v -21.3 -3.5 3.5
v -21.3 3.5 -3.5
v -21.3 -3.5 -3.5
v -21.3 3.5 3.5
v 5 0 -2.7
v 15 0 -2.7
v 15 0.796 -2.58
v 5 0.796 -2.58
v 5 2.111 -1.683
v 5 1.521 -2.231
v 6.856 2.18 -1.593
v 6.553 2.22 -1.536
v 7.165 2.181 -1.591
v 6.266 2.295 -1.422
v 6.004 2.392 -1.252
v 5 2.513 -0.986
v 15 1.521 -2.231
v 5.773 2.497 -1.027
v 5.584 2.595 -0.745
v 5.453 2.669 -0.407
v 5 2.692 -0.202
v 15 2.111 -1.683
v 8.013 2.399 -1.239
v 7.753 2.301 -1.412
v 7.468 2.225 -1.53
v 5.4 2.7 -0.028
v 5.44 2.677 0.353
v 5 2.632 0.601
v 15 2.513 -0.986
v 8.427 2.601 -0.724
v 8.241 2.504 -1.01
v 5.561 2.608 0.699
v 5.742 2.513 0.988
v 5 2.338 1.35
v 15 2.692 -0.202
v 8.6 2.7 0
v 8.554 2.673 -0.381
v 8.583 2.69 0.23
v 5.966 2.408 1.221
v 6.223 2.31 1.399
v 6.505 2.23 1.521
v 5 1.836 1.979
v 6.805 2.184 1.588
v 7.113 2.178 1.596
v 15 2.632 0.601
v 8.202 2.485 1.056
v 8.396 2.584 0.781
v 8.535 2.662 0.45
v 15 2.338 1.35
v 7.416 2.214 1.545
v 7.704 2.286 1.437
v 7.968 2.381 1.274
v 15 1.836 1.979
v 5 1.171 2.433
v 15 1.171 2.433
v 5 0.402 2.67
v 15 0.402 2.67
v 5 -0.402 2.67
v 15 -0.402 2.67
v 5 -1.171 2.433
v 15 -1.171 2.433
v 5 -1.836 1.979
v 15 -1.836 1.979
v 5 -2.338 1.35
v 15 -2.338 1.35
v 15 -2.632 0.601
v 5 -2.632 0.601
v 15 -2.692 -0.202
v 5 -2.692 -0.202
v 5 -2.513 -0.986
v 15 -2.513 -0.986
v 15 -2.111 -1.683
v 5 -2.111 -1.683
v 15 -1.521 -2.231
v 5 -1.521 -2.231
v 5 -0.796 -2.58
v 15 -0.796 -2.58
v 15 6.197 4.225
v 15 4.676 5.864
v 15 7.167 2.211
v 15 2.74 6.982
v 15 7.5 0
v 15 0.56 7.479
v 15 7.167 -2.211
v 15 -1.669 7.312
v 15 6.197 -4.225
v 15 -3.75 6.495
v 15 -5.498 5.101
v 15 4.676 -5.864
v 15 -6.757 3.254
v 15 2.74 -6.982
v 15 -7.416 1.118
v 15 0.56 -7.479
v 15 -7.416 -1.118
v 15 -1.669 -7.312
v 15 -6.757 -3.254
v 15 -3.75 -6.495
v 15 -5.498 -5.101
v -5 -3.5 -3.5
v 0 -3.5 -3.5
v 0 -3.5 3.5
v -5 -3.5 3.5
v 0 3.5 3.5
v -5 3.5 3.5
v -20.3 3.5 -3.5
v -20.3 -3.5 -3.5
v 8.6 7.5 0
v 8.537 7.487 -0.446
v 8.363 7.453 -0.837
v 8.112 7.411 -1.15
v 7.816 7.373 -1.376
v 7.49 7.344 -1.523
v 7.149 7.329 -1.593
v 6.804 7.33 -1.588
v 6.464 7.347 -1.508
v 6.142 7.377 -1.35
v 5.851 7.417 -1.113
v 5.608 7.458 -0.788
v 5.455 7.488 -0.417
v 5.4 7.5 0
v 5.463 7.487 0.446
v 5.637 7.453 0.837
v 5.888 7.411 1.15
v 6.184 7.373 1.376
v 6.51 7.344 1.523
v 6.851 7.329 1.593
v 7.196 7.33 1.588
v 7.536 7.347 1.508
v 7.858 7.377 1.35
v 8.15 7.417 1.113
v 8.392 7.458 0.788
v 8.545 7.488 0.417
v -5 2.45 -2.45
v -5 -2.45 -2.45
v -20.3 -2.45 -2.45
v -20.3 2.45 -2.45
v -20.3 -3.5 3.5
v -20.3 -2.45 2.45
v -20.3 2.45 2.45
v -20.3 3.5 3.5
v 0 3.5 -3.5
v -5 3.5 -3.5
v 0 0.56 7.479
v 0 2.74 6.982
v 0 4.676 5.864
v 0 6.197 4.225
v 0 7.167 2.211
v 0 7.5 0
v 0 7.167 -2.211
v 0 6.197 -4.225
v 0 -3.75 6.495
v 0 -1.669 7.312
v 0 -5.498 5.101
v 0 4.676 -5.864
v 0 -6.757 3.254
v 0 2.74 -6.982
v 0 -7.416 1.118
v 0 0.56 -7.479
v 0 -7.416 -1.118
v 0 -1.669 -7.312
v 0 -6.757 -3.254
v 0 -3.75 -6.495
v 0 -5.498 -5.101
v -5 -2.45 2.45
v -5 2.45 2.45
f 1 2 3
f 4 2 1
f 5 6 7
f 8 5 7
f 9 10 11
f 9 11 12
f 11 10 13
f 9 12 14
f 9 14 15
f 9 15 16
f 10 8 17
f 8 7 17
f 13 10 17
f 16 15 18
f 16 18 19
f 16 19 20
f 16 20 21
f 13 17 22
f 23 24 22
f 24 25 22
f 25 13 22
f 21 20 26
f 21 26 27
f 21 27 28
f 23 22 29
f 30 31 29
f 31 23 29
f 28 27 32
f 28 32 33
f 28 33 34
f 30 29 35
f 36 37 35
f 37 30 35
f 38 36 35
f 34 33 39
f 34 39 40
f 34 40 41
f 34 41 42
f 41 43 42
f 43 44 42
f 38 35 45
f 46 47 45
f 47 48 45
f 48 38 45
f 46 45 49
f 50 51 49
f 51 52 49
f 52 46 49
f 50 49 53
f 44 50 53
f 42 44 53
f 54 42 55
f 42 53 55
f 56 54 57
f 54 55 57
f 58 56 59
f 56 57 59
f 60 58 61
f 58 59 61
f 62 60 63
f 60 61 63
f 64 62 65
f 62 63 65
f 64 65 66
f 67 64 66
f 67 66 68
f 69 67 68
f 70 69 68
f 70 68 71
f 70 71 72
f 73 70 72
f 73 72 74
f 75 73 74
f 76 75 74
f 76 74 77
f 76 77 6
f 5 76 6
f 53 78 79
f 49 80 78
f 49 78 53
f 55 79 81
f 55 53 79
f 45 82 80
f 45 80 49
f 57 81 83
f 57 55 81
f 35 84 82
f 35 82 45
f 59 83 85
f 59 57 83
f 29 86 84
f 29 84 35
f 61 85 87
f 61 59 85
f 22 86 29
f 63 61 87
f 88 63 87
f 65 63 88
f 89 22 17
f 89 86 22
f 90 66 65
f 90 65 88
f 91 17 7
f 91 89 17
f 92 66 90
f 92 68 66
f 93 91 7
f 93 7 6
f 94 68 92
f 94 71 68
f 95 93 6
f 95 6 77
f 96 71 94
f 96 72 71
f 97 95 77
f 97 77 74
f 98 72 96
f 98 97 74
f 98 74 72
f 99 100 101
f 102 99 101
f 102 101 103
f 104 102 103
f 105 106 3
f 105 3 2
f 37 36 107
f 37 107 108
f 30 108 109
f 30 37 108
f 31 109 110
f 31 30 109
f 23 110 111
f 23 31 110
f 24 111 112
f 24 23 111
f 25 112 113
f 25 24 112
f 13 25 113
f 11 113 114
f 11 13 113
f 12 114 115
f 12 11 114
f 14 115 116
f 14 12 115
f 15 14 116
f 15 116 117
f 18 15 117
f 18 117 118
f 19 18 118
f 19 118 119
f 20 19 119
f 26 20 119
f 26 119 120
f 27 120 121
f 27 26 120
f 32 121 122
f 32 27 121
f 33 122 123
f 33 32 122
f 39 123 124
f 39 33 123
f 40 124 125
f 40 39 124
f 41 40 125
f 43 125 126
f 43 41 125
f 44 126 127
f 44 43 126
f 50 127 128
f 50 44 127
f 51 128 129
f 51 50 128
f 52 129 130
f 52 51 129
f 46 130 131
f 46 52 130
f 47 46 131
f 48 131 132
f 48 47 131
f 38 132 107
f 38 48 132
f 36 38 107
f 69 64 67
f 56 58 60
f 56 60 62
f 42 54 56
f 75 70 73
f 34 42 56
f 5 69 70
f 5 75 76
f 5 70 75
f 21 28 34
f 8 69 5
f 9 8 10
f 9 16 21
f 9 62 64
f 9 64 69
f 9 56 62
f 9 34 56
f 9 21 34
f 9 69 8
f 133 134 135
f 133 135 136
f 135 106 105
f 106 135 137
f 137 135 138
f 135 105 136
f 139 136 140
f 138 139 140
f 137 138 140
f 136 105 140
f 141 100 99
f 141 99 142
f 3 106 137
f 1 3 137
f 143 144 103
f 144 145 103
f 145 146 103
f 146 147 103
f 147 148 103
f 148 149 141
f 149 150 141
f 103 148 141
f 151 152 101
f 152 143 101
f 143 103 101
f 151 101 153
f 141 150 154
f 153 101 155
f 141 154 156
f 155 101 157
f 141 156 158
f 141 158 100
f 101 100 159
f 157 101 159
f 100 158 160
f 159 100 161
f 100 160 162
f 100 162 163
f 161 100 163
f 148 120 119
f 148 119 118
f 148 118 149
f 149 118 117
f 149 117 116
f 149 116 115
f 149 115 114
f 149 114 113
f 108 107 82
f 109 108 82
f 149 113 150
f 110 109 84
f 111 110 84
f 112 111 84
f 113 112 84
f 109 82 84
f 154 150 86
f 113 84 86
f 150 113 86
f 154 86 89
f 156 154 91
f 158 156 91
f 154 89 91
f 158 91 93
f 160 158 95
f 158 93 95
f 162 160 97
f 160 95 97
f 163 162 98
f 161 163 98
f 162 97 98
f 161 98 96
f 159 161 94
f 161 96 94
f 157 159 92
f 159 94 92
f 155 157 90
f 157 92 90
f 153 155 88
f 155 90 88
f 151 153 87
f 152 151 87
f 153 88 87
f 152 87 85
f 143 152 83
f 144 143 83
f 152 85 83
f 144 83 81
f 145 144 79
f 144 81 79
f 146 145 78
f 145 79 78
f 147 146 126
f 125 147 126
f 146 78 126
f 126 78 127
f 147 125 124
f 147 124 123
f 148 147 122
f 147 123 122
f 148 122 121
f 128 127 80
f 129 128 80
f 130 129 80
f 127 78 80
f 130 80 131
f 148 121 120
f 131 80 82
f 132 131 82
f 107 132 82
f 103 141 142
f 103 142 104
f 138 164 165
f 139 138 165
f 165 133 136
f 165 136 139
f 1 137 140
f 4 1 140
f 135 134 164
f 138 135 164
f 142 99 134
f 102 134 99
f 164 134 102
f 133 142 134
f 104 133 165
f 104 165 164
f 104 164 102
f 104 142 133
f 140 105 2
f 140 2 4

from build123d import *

# Parameters (mm, degrees)
SKETCH2_W           = 15
SKETCH2_H           = 7.5
SKETCH3_R           = 2.7
CUT_EXTRUDE1_DEPTH  = 10
SKETCH5_R           = 1.6
CUT_EXTRUDE2_DEPTH  = 11
SKETCH6_W           = 7
SKETCH6_H           = 7
BOSS_EXTRUDE1_DEPTH = 5
SKETCH7_W           = 4.9
SKETCH7_H           = 4.9
BOSS_EXTRUDE2_DEPTH = 15.3
SKETCH8_W           = 7
SKETCH8_H           = 7
BOSS_EXTRUDE3_DEPTH = 1


with BuildPart() as part:
    # Sketch2 → Revolve1 (revolve)
    with BuildSketch(Plane.XY):
        with Locations((7.5, 3.75)):
            Rectangle(SKETCH2_W, SKETCH2_H)
    revolve(axis=Axis((15, 0, 0), (-1, 0, 0)))

    # Sketch3 → Cut-Extrude1 (cut)
    with BuildSketch(Plane(origin=(15, 0, 0), x_dir=(0, 0, -1), z_dir=(1, 0, 0))):
        Circle(SKETCH3_R)
    extrude(amount=-CUT_EXTRUDE1_DEPTH, mode=Mode.SUBTRACT)

    # Sketch5 → Cut-Extrude2 (cut)
    with BuildSketch(Plane(origin=(0, 0, 0), x_dir=(1, 0, 0), z_dir=(0, 1, 0))):
        with Locations((7, 0)):
            Circle(SKETCH5_R)
    extrude(amount=CUT_EXTRUDE2_DEPTH, mode=Mode.SUBTRACT)

    # Sketch6 → Boss-Extrude1 (add)
    with BuildSketch(Plane.ZY):
        Rectangle(SKETCH6_W, SKETCH6_H)
    extrude(amount=BOSS_EXTRUDE1_DEPTH)

    # Sketch7 → Boss-Extrude2 (add)
    with BuildSketch(Plane.ZY.offset(5)):
        Rectangle(SKETCH7_W, SKETCH7_H)
    extrude(amount=BOSS_EXTRUDE2_DEPTH)

    # Sketch8 → Boss-Extrude3 (add)
    with BuildSketch(Plane.ZY.offset(20.3)):
        Rectangle(SKETCH8_W, SKETCH8_H)
    extrude(amount=BOSS_EXTRUDE3_DEPTH)


solid = part.part
